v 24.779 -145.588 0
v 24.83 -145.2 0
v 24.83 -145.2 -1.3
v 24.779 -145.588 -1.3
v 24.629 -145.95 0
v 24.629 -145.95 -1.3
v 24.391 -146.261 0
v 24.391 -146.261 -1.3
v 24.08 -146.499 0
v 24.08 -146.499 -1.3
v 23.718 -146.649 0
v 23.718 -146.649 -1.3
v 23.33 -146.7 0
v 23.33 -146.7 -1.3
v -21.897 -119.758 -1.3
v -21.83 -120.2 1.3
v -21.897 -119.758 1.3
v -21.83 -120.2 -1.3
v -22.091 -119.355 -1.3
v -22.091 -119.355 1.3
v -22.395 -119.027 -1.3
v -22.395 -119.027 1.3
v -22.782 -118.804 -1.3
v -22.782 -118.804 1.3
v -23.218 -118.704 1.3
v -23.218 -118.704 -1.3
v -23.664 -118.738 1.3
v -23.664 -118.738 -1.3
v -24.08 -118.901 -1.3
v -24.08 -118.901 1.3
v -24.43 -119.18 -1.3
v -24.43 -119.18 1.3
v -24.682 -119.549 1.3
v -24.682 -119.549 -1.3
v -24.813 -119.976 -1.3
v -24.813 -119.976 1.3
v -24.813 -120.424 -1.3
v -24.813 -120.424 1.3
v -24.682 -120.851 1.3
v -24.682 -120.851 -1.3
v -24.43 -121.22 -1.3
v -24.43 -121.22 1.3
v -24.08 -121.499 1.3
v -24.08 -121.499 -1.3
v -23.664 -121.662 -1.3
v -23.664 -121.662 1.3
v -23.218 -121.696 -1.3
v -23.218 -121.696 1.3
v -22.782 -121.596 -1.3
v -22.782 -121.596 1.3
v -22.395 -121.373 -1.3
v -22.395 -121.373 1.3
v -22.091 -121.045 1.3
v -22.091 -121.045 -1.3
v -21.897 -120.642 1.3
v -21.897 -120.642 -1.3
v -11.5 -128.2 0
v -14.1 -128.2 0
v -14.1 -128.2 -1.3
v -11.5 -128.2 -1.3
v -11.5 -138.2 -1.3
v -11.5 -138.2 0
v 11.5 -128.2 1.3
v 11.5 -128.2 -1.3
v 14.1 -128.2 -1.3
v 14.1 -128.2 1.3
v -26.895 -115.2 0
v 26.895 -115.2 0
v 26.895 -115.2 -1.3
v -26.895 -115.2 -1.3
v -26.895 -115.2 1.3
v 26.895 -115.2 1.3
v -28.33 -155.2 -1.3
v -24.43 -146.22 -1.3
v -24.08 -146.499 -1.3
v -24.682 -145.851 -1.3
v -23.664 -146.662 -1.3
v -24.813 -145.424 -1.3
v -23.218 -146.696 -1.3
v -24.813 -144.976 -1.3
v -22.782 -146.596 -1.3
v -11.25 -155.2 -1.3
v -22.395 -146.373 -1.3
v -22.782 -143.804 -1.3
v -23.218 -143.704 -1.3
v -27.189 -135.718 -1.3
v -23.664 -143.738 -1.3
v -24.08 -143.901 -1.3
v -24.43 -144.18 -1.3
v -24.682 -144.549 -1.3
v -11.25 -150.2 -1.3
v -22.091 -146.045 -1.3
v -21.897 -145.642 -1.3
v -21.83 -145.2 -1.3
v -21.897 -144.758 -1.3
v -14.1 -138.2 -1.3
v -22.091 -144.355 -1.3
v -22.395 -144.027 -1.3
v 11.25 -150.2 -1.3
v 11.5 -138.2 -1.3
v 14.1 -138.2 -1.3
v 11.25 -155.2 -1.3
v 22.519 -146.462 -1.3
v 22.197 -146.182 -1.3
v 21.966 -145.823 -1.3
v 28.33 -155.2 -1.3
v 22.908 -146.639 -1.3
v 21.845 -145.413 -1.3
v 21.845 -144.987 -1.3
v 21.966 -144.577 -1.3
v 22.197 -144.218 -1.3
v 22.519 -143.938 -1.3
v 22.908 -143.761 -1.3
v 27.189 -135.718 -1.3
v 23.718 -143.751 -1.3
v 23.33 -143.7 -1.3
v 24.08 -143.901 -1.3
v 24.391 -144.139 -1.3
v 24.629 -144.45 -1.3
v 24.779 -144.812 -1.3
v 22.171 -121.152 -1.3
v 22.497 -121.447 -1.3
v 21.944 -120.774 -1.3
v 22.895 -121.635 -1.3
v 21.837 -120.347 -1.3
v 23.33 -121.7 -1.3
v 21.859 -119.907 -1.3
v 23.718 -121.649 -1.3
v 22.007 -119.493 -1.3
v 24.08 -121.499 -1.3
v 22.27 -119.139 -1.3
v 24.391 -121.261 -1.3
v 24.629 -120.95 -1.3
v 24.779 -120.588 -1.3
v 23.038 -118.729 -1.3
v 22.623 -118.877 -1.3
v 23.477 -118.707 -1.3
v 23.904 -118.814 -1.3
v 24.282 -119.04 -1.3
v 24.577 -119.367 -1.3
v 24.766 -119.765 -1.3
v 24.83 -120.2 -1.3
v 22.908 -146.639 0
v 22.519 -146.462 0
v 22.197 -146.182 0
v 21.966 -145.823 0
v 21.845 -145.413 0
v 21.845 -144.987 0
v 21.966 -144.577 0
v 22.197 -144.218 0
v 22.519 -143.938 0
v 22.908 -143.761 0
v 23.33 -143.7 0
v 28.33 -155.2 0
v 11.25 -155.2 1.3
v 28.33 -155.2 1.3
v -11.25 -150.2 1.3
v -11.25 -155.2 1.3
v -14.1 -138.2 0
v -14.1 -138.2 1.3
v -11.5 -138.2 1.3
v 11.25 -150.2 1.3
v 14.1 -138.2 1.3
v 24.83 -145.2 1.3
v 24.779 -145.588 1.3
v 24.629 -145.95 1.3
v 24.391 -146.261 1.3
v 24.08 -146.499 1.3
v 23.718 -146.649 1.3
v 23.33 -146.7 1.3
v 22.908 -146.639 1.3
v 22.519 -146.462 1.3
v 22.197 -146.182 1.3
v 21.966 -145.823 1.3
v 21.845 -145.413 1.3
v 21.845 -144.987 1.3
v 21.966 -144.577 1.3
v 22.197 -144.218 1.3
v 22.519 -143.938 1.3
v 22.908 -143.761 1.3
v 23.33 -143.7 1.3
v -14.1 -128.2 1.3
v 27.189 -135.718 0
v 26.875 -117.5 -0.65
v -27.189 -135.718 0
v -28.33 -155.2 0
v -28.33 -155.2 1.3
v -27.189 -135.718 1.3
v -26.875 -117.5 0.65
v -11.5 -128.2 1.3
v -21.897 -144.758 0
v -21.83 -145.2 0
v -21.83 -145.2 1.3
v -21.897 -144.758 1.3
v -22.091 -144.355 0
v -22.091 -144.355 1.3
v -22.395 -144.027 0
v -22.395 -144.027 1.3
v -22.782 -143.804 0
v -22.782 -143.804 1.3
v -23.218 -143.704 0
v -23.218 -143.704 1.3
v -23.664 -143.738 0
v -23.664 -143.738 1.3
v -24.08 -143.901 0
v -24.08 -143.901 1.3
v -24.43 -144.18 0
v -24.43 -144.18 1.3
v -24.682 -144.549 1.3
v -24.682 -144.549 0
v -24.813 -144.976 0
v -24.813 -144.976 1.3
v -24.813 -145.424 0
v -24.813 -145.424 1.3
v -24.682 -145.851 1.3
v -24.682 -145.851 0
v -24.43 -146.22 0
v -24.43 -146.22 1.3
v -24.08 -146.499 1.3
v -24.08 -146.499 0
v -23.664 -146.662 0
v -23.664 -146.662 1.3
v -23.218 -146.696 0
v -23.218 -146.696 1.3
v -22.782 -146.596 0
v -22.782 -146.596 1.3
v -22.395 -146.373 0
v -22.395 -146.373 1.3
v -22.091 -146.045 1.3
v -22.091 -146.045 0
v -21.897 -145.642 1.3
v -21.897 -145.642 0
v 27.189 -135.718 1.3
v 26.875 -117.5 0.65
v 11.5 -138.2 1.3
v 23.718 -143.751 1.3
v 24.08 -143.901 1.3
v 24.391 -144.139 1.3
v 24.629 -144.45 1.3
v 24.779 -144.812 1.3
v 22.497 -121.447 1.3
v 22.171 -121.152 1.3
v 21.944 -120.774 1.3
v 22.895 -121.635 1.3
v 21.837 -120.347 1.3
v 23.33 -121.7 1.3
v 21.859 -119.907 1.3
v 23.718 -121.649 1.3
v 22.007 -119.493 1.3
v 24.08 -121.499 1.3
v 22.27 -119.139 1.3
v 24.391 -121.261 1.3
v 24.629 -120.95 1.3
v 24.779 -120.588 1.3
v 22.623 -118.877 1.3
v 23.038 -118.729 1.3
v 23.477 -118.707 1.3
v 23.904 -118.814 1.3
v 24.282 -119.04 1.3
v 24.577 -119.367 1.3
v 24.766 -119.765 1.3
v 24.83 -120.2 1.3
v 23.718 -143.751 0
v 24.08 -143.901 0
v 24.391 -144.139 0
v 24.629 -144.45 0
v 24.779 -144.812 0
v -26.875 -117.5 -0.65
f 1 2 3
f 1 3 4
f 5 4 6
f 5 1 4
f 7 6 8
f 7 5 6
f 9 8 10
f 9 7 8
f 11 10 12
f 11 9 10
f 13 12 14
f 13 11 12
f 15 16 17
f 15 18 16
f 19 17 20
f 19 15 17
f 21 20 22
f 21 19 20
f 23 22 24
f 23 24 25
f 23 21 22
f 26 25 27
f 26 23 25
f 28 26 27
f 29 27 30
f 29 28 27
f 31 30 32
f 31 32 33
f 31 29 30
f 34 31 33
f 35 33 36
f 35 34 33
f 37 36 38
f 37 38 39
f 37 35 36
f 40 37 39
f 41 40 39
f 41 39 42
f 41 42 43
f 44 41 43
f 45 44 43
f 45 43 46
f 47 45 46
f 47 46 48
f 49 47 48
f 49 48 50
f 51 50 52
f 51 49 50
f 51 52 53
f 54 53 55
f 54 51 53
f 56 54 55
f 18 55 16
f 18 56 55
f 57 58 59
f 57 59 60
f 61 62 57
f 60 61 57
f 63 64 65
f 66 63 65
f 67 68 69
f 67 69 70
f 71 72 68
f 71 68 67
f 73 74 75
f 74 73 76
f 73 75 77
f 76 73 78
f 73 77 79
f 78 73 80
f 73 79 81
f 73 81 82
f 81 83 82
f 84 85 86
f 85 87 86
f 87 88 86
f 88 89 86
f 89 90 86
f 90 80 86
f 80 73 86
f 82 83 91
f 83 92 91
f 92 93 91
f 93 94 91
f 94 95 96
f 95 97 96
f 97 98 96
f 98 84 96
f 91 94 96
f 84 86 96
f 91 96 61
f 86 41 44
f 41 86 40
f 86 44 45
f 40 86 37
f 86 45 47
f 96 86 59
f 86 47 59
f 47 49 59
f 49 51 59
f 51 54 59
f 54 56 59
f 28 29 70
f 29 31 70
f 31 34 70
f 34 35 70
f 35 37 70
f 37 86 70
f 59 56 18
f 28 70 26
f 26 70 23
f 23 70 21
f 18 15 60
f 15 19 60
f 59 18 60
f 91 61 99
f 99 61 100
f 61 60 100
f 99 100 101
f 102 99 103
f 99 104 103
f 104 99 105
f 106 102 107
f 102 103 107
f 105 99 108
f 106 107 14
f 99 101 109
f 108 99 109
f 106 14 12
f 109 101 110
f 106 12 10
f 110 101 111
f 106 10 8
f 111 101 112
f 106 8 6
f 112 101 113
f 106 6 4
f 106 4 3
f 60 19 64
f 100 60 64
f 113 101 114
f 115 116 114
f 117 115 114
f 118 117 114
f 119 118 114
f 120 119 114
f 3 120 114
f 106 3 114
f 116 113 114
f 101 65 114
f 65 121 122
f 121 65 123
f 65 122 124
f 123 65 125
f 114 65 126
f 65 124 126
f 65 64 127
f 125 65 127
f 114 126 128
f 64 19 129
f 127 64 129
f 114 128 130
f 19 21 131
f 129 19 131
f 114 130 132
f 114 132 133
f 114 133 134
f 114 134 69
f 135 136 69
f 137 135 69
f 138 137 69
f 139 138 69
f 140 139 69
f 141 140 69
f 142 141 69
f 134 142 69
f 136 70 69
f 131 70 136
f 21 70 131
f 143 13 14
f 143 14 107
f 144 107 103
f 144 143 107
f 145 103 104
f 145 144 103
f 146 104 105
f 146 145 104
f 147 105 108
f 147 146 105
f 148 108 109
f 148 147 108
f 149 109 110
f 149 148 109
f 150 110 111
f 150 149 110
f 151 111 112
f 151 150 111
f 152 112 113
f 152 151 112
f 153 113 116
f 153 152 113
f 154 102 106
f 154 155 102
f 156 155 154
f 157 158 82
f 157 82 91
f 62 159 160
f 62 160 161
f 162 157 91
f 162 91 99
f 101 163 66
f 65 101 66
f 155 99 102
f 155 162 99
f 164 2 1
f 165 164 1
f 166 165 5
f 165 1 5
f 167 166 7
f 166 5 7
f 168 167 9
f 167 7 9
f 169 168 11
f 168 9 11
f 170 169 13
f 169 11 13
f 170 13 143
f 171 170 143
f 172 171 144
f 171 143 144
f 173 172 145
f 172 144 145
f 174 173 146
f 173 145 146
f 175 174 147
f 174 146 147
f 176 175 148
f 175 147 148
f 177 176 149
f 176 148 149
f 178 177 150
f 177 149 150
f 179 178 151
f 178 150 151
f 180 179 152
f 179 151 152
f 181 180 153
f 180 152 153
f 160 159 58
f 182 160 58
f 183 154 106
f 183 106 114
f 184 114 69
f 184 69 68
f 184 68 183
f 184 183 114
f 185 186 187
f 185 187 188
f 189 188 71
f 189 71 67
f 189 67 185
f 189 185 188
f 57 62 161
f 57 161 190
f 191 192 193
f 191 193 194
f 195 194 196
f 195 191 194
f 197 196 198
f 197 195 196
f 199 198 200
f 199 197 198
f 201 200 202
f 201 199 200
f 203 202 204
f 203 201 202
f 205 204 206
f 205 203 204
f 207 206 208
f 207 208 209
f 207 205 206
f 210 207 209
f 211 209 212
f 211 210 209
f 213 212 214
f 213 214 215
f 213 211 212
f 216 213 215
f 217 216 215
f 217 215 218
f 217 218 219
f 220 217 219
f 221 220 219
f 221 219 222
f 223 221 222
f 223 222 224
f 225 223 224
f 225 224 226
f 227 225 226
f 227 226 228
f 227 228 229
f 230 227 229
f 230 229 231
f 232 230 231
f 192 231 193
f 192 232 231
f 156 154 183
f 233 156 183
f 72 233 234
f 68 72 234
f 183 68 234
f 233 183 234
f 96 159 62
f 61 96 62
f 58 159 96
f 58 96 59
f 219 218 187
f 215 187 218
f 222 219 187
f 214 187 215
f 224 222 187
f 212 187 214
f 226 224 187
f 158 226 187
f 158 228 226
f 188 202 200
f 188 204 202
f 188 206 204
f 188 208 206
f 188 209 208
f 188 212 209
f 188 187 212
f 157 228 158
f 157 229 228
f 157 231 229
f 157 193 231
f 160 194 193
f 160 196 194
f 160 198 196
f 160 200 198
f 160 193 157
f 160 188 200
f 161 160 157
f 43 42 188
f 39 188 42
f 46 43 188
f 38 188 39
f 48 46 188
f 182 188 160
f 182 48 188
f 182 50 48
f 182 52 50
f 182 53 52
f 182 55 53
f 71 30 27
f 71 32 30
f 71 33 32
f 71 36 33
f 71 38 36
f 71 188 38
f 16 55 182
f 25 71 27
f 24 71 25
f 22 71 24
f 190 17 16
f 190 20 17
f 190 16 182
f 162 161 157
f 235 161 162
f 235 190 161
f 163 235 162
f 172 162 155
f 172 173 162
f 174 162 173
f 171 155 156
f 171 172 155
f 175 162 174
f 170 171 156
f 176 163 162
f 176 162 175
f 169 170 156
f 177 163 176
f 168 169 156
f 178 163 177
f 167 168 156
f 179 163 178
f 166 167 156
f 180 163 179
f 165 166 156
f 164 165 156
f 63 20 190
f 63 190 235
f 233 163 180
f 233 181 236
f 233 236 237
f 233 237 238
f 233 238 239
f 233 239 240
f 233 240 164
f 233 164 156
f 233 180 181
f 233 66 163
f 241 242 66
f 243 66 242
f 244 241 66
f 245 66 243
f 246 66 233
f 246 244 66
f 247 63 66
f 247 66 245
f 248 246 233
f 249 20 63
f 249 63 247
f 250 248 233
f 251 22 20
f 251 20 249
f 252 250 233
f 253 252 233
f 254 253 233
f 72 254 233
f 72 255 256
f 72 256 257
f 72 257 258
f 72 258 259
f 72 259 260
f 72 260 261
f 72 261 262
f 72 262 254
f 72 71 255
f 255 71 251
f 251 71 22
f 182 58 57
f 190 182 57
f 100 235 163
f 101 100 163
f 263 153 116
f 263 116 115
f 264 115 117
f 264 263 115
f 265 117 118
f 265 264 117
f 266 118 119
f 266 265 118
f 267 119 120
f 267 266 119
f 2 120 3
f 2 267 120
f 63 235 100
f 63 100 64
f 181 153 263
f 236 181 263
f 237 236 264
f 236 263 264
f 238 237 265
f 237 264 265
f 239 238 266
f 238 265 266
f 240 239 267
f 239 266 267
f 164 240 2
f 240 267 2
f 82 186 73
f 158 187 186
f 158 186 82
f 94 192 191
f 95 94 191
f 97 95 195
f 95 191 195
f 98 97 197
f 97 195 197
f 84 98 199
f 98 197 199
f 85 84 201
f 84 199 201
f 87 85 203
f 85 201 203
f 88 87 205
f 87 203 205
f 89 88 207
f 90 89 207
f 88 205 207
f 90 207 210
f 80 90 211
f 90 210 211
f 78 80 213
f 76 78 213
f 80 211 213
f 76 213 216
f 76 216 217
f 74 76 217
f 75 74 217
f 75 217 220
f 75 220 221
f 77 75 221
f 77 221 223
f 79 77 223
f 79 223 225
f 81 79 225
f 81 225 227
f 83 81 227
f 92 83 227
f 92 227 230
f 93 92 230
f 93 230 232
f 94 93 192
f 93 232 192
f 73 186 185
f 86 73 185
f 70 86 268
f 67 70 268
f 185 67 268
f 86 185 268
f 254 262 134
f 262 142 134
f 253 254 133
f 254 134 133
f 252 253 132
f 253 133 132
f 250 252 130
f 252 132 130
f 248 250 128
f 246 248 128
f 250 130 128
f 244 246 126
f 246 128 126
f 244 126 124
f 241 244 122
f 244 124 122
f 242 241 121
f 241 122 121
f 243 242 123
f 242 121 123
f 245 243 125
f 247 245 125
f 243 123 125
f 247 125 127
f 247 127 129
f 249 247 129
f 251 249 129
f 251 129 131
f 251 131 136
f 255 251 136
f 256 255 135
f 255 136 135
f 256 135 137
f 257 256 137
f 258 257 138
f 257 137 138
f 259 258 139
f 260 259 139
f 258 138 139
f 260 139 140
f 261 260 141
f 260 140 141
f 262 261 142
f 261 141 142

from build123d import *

# Parameters (mm, degrees)
F1_W          = 2.6
F1_H          = 10
F1_R          = 1.5
F2_DEPTH      = 1.3
F2_DEPTH_BACK = 1.3
F4_DEPTH      = 2.6010001


with BuildPart() as f2:
    # F1 (on Top) → F2 (new body, two sides)
    with BuildSketch(Plane.XY) as f2_sk:
        with BuildLine():
            Line((26.8950708133, -115.2), (0, -115.2))
            Line((0, -115.2), (0, -150.2))
            Line((0, -150.2), (11.25, -150.2))
            Line((11.25, -150.2), (11.25, -155.2))
            Line((11.25, -155.2), (23.3302194863, -155.2))
            Line((23.3302194863, -155.2), (28.3302194863, -155.2))
            add(Edge.make_bspline(
                [(28.3302194863, -155.2), (27.4209763541, -143.1676427283), (26.763234957, -130.0249441378), (26.8860792155, -115.9692984983), (26.8950708133, -115.2)],
                knots=[0.0235919502, 0.0235919502, 0.0235919502, 0.0235919502, 0.1835372396, 0.1927653287, 0.1927653287, 0.1927653287, 0.1927653287], degree=3))
        make_face()
        with Locations((12.8, -133.2)):
            Rectangle(F1_W, F1_H, mode=Mode.SUBTRACT)
        with BuildLine():
            ThreePointArc((24.8302194863, -145.2), (24.3908796581, -146.2606601718), (23.3302194863, -146.7))
            ThreePointArc((23.3302194863, -146.7), (21.8302194863, -145.2), (23.3302194863, -143.7))
            ThreePointArc((23.3302194863, -143.7), (24.3908796581, -144.1393398282), (24.8302194863, -145.2))
        make_face(mode=Mode.SUBTRACT)
        with BuildLine():
            ThreePointArc((24.8302194863, -120.2), (24.3908796581, -121.2606601718), (23.3302194863, -121.7))
            ThreePointArc((23.3302194863, -121.7), (22.2695593146, -119.1393398282), (24.8302194863, -120.2))
        make_face(mode=Mode.SUBTRACT)
        with BuildLine():
            add(Edge.make_bspline(
                [(-28.3302194863, -155.2), (-27.4209763541, -143.1676427283), (-26.763234957, -130.0249441378), (-26.8860792155, -115.9692984983), (-26.8950708133, -115.2)],
                knots=[0.0235919502, 0.0235919502, 0.0235919502, 0.0235919502, 0.1835372396, 0.1927653287, 0.1927653287, 0.1927653287, 0.1927653287], degree=3))
            Line((-28.3302194863, -155.2), (-11.25, -155.2))
            Line((-11.25, -155.2), (-11.25, -150.2))
            Line((-11.25, -150.2), (0, -150.2))
            Line((0, -150.2), (0, -115.2))
            Line((0, -115.2), (-26.8950708133, -115.2))
        make_face()
        with Locations((-23.3302194863, -145.2)):
            Circle(F1_R, mode=Mode.SUBTRACT)
        with Locations((-23.3302194863, -120.2)):
            Circle(F1_R, mode=Mode.SUBTRACT)
        with Locations((-12.8, -133.2)):
            Rectangle(F1_W, F1_H, mode=Mode.SUBTRACT)
    extrude(amount=F2_DEPTH)
    extrude(f2_sk.sketch, amount=-F2_DEPTH_BACK)

    # F3 (on face) → F4 (cut, through all)
    with BuildSketch(Plane.XY.offset(1.3)):
        Polygon((35.375, 8.25), (27.6897869255, 8.25), (27.6897869255, -6.25), (35.375, -6.25), (39.6897869255, -6.25), (39.6897869255, 8.25), align=None)
        Polygon((-27.6897869255, -6.25), (-27.6897869255, 8.25), (-35.375, 8.25), (-39.6897869255, 8.25), (-39.6897869255, -6.25), (-35.375, -6.25), align=None)
    extrude(amount=-F4_DEPTH, mode=Mode.SUBTRACT)


solid = f2.part
